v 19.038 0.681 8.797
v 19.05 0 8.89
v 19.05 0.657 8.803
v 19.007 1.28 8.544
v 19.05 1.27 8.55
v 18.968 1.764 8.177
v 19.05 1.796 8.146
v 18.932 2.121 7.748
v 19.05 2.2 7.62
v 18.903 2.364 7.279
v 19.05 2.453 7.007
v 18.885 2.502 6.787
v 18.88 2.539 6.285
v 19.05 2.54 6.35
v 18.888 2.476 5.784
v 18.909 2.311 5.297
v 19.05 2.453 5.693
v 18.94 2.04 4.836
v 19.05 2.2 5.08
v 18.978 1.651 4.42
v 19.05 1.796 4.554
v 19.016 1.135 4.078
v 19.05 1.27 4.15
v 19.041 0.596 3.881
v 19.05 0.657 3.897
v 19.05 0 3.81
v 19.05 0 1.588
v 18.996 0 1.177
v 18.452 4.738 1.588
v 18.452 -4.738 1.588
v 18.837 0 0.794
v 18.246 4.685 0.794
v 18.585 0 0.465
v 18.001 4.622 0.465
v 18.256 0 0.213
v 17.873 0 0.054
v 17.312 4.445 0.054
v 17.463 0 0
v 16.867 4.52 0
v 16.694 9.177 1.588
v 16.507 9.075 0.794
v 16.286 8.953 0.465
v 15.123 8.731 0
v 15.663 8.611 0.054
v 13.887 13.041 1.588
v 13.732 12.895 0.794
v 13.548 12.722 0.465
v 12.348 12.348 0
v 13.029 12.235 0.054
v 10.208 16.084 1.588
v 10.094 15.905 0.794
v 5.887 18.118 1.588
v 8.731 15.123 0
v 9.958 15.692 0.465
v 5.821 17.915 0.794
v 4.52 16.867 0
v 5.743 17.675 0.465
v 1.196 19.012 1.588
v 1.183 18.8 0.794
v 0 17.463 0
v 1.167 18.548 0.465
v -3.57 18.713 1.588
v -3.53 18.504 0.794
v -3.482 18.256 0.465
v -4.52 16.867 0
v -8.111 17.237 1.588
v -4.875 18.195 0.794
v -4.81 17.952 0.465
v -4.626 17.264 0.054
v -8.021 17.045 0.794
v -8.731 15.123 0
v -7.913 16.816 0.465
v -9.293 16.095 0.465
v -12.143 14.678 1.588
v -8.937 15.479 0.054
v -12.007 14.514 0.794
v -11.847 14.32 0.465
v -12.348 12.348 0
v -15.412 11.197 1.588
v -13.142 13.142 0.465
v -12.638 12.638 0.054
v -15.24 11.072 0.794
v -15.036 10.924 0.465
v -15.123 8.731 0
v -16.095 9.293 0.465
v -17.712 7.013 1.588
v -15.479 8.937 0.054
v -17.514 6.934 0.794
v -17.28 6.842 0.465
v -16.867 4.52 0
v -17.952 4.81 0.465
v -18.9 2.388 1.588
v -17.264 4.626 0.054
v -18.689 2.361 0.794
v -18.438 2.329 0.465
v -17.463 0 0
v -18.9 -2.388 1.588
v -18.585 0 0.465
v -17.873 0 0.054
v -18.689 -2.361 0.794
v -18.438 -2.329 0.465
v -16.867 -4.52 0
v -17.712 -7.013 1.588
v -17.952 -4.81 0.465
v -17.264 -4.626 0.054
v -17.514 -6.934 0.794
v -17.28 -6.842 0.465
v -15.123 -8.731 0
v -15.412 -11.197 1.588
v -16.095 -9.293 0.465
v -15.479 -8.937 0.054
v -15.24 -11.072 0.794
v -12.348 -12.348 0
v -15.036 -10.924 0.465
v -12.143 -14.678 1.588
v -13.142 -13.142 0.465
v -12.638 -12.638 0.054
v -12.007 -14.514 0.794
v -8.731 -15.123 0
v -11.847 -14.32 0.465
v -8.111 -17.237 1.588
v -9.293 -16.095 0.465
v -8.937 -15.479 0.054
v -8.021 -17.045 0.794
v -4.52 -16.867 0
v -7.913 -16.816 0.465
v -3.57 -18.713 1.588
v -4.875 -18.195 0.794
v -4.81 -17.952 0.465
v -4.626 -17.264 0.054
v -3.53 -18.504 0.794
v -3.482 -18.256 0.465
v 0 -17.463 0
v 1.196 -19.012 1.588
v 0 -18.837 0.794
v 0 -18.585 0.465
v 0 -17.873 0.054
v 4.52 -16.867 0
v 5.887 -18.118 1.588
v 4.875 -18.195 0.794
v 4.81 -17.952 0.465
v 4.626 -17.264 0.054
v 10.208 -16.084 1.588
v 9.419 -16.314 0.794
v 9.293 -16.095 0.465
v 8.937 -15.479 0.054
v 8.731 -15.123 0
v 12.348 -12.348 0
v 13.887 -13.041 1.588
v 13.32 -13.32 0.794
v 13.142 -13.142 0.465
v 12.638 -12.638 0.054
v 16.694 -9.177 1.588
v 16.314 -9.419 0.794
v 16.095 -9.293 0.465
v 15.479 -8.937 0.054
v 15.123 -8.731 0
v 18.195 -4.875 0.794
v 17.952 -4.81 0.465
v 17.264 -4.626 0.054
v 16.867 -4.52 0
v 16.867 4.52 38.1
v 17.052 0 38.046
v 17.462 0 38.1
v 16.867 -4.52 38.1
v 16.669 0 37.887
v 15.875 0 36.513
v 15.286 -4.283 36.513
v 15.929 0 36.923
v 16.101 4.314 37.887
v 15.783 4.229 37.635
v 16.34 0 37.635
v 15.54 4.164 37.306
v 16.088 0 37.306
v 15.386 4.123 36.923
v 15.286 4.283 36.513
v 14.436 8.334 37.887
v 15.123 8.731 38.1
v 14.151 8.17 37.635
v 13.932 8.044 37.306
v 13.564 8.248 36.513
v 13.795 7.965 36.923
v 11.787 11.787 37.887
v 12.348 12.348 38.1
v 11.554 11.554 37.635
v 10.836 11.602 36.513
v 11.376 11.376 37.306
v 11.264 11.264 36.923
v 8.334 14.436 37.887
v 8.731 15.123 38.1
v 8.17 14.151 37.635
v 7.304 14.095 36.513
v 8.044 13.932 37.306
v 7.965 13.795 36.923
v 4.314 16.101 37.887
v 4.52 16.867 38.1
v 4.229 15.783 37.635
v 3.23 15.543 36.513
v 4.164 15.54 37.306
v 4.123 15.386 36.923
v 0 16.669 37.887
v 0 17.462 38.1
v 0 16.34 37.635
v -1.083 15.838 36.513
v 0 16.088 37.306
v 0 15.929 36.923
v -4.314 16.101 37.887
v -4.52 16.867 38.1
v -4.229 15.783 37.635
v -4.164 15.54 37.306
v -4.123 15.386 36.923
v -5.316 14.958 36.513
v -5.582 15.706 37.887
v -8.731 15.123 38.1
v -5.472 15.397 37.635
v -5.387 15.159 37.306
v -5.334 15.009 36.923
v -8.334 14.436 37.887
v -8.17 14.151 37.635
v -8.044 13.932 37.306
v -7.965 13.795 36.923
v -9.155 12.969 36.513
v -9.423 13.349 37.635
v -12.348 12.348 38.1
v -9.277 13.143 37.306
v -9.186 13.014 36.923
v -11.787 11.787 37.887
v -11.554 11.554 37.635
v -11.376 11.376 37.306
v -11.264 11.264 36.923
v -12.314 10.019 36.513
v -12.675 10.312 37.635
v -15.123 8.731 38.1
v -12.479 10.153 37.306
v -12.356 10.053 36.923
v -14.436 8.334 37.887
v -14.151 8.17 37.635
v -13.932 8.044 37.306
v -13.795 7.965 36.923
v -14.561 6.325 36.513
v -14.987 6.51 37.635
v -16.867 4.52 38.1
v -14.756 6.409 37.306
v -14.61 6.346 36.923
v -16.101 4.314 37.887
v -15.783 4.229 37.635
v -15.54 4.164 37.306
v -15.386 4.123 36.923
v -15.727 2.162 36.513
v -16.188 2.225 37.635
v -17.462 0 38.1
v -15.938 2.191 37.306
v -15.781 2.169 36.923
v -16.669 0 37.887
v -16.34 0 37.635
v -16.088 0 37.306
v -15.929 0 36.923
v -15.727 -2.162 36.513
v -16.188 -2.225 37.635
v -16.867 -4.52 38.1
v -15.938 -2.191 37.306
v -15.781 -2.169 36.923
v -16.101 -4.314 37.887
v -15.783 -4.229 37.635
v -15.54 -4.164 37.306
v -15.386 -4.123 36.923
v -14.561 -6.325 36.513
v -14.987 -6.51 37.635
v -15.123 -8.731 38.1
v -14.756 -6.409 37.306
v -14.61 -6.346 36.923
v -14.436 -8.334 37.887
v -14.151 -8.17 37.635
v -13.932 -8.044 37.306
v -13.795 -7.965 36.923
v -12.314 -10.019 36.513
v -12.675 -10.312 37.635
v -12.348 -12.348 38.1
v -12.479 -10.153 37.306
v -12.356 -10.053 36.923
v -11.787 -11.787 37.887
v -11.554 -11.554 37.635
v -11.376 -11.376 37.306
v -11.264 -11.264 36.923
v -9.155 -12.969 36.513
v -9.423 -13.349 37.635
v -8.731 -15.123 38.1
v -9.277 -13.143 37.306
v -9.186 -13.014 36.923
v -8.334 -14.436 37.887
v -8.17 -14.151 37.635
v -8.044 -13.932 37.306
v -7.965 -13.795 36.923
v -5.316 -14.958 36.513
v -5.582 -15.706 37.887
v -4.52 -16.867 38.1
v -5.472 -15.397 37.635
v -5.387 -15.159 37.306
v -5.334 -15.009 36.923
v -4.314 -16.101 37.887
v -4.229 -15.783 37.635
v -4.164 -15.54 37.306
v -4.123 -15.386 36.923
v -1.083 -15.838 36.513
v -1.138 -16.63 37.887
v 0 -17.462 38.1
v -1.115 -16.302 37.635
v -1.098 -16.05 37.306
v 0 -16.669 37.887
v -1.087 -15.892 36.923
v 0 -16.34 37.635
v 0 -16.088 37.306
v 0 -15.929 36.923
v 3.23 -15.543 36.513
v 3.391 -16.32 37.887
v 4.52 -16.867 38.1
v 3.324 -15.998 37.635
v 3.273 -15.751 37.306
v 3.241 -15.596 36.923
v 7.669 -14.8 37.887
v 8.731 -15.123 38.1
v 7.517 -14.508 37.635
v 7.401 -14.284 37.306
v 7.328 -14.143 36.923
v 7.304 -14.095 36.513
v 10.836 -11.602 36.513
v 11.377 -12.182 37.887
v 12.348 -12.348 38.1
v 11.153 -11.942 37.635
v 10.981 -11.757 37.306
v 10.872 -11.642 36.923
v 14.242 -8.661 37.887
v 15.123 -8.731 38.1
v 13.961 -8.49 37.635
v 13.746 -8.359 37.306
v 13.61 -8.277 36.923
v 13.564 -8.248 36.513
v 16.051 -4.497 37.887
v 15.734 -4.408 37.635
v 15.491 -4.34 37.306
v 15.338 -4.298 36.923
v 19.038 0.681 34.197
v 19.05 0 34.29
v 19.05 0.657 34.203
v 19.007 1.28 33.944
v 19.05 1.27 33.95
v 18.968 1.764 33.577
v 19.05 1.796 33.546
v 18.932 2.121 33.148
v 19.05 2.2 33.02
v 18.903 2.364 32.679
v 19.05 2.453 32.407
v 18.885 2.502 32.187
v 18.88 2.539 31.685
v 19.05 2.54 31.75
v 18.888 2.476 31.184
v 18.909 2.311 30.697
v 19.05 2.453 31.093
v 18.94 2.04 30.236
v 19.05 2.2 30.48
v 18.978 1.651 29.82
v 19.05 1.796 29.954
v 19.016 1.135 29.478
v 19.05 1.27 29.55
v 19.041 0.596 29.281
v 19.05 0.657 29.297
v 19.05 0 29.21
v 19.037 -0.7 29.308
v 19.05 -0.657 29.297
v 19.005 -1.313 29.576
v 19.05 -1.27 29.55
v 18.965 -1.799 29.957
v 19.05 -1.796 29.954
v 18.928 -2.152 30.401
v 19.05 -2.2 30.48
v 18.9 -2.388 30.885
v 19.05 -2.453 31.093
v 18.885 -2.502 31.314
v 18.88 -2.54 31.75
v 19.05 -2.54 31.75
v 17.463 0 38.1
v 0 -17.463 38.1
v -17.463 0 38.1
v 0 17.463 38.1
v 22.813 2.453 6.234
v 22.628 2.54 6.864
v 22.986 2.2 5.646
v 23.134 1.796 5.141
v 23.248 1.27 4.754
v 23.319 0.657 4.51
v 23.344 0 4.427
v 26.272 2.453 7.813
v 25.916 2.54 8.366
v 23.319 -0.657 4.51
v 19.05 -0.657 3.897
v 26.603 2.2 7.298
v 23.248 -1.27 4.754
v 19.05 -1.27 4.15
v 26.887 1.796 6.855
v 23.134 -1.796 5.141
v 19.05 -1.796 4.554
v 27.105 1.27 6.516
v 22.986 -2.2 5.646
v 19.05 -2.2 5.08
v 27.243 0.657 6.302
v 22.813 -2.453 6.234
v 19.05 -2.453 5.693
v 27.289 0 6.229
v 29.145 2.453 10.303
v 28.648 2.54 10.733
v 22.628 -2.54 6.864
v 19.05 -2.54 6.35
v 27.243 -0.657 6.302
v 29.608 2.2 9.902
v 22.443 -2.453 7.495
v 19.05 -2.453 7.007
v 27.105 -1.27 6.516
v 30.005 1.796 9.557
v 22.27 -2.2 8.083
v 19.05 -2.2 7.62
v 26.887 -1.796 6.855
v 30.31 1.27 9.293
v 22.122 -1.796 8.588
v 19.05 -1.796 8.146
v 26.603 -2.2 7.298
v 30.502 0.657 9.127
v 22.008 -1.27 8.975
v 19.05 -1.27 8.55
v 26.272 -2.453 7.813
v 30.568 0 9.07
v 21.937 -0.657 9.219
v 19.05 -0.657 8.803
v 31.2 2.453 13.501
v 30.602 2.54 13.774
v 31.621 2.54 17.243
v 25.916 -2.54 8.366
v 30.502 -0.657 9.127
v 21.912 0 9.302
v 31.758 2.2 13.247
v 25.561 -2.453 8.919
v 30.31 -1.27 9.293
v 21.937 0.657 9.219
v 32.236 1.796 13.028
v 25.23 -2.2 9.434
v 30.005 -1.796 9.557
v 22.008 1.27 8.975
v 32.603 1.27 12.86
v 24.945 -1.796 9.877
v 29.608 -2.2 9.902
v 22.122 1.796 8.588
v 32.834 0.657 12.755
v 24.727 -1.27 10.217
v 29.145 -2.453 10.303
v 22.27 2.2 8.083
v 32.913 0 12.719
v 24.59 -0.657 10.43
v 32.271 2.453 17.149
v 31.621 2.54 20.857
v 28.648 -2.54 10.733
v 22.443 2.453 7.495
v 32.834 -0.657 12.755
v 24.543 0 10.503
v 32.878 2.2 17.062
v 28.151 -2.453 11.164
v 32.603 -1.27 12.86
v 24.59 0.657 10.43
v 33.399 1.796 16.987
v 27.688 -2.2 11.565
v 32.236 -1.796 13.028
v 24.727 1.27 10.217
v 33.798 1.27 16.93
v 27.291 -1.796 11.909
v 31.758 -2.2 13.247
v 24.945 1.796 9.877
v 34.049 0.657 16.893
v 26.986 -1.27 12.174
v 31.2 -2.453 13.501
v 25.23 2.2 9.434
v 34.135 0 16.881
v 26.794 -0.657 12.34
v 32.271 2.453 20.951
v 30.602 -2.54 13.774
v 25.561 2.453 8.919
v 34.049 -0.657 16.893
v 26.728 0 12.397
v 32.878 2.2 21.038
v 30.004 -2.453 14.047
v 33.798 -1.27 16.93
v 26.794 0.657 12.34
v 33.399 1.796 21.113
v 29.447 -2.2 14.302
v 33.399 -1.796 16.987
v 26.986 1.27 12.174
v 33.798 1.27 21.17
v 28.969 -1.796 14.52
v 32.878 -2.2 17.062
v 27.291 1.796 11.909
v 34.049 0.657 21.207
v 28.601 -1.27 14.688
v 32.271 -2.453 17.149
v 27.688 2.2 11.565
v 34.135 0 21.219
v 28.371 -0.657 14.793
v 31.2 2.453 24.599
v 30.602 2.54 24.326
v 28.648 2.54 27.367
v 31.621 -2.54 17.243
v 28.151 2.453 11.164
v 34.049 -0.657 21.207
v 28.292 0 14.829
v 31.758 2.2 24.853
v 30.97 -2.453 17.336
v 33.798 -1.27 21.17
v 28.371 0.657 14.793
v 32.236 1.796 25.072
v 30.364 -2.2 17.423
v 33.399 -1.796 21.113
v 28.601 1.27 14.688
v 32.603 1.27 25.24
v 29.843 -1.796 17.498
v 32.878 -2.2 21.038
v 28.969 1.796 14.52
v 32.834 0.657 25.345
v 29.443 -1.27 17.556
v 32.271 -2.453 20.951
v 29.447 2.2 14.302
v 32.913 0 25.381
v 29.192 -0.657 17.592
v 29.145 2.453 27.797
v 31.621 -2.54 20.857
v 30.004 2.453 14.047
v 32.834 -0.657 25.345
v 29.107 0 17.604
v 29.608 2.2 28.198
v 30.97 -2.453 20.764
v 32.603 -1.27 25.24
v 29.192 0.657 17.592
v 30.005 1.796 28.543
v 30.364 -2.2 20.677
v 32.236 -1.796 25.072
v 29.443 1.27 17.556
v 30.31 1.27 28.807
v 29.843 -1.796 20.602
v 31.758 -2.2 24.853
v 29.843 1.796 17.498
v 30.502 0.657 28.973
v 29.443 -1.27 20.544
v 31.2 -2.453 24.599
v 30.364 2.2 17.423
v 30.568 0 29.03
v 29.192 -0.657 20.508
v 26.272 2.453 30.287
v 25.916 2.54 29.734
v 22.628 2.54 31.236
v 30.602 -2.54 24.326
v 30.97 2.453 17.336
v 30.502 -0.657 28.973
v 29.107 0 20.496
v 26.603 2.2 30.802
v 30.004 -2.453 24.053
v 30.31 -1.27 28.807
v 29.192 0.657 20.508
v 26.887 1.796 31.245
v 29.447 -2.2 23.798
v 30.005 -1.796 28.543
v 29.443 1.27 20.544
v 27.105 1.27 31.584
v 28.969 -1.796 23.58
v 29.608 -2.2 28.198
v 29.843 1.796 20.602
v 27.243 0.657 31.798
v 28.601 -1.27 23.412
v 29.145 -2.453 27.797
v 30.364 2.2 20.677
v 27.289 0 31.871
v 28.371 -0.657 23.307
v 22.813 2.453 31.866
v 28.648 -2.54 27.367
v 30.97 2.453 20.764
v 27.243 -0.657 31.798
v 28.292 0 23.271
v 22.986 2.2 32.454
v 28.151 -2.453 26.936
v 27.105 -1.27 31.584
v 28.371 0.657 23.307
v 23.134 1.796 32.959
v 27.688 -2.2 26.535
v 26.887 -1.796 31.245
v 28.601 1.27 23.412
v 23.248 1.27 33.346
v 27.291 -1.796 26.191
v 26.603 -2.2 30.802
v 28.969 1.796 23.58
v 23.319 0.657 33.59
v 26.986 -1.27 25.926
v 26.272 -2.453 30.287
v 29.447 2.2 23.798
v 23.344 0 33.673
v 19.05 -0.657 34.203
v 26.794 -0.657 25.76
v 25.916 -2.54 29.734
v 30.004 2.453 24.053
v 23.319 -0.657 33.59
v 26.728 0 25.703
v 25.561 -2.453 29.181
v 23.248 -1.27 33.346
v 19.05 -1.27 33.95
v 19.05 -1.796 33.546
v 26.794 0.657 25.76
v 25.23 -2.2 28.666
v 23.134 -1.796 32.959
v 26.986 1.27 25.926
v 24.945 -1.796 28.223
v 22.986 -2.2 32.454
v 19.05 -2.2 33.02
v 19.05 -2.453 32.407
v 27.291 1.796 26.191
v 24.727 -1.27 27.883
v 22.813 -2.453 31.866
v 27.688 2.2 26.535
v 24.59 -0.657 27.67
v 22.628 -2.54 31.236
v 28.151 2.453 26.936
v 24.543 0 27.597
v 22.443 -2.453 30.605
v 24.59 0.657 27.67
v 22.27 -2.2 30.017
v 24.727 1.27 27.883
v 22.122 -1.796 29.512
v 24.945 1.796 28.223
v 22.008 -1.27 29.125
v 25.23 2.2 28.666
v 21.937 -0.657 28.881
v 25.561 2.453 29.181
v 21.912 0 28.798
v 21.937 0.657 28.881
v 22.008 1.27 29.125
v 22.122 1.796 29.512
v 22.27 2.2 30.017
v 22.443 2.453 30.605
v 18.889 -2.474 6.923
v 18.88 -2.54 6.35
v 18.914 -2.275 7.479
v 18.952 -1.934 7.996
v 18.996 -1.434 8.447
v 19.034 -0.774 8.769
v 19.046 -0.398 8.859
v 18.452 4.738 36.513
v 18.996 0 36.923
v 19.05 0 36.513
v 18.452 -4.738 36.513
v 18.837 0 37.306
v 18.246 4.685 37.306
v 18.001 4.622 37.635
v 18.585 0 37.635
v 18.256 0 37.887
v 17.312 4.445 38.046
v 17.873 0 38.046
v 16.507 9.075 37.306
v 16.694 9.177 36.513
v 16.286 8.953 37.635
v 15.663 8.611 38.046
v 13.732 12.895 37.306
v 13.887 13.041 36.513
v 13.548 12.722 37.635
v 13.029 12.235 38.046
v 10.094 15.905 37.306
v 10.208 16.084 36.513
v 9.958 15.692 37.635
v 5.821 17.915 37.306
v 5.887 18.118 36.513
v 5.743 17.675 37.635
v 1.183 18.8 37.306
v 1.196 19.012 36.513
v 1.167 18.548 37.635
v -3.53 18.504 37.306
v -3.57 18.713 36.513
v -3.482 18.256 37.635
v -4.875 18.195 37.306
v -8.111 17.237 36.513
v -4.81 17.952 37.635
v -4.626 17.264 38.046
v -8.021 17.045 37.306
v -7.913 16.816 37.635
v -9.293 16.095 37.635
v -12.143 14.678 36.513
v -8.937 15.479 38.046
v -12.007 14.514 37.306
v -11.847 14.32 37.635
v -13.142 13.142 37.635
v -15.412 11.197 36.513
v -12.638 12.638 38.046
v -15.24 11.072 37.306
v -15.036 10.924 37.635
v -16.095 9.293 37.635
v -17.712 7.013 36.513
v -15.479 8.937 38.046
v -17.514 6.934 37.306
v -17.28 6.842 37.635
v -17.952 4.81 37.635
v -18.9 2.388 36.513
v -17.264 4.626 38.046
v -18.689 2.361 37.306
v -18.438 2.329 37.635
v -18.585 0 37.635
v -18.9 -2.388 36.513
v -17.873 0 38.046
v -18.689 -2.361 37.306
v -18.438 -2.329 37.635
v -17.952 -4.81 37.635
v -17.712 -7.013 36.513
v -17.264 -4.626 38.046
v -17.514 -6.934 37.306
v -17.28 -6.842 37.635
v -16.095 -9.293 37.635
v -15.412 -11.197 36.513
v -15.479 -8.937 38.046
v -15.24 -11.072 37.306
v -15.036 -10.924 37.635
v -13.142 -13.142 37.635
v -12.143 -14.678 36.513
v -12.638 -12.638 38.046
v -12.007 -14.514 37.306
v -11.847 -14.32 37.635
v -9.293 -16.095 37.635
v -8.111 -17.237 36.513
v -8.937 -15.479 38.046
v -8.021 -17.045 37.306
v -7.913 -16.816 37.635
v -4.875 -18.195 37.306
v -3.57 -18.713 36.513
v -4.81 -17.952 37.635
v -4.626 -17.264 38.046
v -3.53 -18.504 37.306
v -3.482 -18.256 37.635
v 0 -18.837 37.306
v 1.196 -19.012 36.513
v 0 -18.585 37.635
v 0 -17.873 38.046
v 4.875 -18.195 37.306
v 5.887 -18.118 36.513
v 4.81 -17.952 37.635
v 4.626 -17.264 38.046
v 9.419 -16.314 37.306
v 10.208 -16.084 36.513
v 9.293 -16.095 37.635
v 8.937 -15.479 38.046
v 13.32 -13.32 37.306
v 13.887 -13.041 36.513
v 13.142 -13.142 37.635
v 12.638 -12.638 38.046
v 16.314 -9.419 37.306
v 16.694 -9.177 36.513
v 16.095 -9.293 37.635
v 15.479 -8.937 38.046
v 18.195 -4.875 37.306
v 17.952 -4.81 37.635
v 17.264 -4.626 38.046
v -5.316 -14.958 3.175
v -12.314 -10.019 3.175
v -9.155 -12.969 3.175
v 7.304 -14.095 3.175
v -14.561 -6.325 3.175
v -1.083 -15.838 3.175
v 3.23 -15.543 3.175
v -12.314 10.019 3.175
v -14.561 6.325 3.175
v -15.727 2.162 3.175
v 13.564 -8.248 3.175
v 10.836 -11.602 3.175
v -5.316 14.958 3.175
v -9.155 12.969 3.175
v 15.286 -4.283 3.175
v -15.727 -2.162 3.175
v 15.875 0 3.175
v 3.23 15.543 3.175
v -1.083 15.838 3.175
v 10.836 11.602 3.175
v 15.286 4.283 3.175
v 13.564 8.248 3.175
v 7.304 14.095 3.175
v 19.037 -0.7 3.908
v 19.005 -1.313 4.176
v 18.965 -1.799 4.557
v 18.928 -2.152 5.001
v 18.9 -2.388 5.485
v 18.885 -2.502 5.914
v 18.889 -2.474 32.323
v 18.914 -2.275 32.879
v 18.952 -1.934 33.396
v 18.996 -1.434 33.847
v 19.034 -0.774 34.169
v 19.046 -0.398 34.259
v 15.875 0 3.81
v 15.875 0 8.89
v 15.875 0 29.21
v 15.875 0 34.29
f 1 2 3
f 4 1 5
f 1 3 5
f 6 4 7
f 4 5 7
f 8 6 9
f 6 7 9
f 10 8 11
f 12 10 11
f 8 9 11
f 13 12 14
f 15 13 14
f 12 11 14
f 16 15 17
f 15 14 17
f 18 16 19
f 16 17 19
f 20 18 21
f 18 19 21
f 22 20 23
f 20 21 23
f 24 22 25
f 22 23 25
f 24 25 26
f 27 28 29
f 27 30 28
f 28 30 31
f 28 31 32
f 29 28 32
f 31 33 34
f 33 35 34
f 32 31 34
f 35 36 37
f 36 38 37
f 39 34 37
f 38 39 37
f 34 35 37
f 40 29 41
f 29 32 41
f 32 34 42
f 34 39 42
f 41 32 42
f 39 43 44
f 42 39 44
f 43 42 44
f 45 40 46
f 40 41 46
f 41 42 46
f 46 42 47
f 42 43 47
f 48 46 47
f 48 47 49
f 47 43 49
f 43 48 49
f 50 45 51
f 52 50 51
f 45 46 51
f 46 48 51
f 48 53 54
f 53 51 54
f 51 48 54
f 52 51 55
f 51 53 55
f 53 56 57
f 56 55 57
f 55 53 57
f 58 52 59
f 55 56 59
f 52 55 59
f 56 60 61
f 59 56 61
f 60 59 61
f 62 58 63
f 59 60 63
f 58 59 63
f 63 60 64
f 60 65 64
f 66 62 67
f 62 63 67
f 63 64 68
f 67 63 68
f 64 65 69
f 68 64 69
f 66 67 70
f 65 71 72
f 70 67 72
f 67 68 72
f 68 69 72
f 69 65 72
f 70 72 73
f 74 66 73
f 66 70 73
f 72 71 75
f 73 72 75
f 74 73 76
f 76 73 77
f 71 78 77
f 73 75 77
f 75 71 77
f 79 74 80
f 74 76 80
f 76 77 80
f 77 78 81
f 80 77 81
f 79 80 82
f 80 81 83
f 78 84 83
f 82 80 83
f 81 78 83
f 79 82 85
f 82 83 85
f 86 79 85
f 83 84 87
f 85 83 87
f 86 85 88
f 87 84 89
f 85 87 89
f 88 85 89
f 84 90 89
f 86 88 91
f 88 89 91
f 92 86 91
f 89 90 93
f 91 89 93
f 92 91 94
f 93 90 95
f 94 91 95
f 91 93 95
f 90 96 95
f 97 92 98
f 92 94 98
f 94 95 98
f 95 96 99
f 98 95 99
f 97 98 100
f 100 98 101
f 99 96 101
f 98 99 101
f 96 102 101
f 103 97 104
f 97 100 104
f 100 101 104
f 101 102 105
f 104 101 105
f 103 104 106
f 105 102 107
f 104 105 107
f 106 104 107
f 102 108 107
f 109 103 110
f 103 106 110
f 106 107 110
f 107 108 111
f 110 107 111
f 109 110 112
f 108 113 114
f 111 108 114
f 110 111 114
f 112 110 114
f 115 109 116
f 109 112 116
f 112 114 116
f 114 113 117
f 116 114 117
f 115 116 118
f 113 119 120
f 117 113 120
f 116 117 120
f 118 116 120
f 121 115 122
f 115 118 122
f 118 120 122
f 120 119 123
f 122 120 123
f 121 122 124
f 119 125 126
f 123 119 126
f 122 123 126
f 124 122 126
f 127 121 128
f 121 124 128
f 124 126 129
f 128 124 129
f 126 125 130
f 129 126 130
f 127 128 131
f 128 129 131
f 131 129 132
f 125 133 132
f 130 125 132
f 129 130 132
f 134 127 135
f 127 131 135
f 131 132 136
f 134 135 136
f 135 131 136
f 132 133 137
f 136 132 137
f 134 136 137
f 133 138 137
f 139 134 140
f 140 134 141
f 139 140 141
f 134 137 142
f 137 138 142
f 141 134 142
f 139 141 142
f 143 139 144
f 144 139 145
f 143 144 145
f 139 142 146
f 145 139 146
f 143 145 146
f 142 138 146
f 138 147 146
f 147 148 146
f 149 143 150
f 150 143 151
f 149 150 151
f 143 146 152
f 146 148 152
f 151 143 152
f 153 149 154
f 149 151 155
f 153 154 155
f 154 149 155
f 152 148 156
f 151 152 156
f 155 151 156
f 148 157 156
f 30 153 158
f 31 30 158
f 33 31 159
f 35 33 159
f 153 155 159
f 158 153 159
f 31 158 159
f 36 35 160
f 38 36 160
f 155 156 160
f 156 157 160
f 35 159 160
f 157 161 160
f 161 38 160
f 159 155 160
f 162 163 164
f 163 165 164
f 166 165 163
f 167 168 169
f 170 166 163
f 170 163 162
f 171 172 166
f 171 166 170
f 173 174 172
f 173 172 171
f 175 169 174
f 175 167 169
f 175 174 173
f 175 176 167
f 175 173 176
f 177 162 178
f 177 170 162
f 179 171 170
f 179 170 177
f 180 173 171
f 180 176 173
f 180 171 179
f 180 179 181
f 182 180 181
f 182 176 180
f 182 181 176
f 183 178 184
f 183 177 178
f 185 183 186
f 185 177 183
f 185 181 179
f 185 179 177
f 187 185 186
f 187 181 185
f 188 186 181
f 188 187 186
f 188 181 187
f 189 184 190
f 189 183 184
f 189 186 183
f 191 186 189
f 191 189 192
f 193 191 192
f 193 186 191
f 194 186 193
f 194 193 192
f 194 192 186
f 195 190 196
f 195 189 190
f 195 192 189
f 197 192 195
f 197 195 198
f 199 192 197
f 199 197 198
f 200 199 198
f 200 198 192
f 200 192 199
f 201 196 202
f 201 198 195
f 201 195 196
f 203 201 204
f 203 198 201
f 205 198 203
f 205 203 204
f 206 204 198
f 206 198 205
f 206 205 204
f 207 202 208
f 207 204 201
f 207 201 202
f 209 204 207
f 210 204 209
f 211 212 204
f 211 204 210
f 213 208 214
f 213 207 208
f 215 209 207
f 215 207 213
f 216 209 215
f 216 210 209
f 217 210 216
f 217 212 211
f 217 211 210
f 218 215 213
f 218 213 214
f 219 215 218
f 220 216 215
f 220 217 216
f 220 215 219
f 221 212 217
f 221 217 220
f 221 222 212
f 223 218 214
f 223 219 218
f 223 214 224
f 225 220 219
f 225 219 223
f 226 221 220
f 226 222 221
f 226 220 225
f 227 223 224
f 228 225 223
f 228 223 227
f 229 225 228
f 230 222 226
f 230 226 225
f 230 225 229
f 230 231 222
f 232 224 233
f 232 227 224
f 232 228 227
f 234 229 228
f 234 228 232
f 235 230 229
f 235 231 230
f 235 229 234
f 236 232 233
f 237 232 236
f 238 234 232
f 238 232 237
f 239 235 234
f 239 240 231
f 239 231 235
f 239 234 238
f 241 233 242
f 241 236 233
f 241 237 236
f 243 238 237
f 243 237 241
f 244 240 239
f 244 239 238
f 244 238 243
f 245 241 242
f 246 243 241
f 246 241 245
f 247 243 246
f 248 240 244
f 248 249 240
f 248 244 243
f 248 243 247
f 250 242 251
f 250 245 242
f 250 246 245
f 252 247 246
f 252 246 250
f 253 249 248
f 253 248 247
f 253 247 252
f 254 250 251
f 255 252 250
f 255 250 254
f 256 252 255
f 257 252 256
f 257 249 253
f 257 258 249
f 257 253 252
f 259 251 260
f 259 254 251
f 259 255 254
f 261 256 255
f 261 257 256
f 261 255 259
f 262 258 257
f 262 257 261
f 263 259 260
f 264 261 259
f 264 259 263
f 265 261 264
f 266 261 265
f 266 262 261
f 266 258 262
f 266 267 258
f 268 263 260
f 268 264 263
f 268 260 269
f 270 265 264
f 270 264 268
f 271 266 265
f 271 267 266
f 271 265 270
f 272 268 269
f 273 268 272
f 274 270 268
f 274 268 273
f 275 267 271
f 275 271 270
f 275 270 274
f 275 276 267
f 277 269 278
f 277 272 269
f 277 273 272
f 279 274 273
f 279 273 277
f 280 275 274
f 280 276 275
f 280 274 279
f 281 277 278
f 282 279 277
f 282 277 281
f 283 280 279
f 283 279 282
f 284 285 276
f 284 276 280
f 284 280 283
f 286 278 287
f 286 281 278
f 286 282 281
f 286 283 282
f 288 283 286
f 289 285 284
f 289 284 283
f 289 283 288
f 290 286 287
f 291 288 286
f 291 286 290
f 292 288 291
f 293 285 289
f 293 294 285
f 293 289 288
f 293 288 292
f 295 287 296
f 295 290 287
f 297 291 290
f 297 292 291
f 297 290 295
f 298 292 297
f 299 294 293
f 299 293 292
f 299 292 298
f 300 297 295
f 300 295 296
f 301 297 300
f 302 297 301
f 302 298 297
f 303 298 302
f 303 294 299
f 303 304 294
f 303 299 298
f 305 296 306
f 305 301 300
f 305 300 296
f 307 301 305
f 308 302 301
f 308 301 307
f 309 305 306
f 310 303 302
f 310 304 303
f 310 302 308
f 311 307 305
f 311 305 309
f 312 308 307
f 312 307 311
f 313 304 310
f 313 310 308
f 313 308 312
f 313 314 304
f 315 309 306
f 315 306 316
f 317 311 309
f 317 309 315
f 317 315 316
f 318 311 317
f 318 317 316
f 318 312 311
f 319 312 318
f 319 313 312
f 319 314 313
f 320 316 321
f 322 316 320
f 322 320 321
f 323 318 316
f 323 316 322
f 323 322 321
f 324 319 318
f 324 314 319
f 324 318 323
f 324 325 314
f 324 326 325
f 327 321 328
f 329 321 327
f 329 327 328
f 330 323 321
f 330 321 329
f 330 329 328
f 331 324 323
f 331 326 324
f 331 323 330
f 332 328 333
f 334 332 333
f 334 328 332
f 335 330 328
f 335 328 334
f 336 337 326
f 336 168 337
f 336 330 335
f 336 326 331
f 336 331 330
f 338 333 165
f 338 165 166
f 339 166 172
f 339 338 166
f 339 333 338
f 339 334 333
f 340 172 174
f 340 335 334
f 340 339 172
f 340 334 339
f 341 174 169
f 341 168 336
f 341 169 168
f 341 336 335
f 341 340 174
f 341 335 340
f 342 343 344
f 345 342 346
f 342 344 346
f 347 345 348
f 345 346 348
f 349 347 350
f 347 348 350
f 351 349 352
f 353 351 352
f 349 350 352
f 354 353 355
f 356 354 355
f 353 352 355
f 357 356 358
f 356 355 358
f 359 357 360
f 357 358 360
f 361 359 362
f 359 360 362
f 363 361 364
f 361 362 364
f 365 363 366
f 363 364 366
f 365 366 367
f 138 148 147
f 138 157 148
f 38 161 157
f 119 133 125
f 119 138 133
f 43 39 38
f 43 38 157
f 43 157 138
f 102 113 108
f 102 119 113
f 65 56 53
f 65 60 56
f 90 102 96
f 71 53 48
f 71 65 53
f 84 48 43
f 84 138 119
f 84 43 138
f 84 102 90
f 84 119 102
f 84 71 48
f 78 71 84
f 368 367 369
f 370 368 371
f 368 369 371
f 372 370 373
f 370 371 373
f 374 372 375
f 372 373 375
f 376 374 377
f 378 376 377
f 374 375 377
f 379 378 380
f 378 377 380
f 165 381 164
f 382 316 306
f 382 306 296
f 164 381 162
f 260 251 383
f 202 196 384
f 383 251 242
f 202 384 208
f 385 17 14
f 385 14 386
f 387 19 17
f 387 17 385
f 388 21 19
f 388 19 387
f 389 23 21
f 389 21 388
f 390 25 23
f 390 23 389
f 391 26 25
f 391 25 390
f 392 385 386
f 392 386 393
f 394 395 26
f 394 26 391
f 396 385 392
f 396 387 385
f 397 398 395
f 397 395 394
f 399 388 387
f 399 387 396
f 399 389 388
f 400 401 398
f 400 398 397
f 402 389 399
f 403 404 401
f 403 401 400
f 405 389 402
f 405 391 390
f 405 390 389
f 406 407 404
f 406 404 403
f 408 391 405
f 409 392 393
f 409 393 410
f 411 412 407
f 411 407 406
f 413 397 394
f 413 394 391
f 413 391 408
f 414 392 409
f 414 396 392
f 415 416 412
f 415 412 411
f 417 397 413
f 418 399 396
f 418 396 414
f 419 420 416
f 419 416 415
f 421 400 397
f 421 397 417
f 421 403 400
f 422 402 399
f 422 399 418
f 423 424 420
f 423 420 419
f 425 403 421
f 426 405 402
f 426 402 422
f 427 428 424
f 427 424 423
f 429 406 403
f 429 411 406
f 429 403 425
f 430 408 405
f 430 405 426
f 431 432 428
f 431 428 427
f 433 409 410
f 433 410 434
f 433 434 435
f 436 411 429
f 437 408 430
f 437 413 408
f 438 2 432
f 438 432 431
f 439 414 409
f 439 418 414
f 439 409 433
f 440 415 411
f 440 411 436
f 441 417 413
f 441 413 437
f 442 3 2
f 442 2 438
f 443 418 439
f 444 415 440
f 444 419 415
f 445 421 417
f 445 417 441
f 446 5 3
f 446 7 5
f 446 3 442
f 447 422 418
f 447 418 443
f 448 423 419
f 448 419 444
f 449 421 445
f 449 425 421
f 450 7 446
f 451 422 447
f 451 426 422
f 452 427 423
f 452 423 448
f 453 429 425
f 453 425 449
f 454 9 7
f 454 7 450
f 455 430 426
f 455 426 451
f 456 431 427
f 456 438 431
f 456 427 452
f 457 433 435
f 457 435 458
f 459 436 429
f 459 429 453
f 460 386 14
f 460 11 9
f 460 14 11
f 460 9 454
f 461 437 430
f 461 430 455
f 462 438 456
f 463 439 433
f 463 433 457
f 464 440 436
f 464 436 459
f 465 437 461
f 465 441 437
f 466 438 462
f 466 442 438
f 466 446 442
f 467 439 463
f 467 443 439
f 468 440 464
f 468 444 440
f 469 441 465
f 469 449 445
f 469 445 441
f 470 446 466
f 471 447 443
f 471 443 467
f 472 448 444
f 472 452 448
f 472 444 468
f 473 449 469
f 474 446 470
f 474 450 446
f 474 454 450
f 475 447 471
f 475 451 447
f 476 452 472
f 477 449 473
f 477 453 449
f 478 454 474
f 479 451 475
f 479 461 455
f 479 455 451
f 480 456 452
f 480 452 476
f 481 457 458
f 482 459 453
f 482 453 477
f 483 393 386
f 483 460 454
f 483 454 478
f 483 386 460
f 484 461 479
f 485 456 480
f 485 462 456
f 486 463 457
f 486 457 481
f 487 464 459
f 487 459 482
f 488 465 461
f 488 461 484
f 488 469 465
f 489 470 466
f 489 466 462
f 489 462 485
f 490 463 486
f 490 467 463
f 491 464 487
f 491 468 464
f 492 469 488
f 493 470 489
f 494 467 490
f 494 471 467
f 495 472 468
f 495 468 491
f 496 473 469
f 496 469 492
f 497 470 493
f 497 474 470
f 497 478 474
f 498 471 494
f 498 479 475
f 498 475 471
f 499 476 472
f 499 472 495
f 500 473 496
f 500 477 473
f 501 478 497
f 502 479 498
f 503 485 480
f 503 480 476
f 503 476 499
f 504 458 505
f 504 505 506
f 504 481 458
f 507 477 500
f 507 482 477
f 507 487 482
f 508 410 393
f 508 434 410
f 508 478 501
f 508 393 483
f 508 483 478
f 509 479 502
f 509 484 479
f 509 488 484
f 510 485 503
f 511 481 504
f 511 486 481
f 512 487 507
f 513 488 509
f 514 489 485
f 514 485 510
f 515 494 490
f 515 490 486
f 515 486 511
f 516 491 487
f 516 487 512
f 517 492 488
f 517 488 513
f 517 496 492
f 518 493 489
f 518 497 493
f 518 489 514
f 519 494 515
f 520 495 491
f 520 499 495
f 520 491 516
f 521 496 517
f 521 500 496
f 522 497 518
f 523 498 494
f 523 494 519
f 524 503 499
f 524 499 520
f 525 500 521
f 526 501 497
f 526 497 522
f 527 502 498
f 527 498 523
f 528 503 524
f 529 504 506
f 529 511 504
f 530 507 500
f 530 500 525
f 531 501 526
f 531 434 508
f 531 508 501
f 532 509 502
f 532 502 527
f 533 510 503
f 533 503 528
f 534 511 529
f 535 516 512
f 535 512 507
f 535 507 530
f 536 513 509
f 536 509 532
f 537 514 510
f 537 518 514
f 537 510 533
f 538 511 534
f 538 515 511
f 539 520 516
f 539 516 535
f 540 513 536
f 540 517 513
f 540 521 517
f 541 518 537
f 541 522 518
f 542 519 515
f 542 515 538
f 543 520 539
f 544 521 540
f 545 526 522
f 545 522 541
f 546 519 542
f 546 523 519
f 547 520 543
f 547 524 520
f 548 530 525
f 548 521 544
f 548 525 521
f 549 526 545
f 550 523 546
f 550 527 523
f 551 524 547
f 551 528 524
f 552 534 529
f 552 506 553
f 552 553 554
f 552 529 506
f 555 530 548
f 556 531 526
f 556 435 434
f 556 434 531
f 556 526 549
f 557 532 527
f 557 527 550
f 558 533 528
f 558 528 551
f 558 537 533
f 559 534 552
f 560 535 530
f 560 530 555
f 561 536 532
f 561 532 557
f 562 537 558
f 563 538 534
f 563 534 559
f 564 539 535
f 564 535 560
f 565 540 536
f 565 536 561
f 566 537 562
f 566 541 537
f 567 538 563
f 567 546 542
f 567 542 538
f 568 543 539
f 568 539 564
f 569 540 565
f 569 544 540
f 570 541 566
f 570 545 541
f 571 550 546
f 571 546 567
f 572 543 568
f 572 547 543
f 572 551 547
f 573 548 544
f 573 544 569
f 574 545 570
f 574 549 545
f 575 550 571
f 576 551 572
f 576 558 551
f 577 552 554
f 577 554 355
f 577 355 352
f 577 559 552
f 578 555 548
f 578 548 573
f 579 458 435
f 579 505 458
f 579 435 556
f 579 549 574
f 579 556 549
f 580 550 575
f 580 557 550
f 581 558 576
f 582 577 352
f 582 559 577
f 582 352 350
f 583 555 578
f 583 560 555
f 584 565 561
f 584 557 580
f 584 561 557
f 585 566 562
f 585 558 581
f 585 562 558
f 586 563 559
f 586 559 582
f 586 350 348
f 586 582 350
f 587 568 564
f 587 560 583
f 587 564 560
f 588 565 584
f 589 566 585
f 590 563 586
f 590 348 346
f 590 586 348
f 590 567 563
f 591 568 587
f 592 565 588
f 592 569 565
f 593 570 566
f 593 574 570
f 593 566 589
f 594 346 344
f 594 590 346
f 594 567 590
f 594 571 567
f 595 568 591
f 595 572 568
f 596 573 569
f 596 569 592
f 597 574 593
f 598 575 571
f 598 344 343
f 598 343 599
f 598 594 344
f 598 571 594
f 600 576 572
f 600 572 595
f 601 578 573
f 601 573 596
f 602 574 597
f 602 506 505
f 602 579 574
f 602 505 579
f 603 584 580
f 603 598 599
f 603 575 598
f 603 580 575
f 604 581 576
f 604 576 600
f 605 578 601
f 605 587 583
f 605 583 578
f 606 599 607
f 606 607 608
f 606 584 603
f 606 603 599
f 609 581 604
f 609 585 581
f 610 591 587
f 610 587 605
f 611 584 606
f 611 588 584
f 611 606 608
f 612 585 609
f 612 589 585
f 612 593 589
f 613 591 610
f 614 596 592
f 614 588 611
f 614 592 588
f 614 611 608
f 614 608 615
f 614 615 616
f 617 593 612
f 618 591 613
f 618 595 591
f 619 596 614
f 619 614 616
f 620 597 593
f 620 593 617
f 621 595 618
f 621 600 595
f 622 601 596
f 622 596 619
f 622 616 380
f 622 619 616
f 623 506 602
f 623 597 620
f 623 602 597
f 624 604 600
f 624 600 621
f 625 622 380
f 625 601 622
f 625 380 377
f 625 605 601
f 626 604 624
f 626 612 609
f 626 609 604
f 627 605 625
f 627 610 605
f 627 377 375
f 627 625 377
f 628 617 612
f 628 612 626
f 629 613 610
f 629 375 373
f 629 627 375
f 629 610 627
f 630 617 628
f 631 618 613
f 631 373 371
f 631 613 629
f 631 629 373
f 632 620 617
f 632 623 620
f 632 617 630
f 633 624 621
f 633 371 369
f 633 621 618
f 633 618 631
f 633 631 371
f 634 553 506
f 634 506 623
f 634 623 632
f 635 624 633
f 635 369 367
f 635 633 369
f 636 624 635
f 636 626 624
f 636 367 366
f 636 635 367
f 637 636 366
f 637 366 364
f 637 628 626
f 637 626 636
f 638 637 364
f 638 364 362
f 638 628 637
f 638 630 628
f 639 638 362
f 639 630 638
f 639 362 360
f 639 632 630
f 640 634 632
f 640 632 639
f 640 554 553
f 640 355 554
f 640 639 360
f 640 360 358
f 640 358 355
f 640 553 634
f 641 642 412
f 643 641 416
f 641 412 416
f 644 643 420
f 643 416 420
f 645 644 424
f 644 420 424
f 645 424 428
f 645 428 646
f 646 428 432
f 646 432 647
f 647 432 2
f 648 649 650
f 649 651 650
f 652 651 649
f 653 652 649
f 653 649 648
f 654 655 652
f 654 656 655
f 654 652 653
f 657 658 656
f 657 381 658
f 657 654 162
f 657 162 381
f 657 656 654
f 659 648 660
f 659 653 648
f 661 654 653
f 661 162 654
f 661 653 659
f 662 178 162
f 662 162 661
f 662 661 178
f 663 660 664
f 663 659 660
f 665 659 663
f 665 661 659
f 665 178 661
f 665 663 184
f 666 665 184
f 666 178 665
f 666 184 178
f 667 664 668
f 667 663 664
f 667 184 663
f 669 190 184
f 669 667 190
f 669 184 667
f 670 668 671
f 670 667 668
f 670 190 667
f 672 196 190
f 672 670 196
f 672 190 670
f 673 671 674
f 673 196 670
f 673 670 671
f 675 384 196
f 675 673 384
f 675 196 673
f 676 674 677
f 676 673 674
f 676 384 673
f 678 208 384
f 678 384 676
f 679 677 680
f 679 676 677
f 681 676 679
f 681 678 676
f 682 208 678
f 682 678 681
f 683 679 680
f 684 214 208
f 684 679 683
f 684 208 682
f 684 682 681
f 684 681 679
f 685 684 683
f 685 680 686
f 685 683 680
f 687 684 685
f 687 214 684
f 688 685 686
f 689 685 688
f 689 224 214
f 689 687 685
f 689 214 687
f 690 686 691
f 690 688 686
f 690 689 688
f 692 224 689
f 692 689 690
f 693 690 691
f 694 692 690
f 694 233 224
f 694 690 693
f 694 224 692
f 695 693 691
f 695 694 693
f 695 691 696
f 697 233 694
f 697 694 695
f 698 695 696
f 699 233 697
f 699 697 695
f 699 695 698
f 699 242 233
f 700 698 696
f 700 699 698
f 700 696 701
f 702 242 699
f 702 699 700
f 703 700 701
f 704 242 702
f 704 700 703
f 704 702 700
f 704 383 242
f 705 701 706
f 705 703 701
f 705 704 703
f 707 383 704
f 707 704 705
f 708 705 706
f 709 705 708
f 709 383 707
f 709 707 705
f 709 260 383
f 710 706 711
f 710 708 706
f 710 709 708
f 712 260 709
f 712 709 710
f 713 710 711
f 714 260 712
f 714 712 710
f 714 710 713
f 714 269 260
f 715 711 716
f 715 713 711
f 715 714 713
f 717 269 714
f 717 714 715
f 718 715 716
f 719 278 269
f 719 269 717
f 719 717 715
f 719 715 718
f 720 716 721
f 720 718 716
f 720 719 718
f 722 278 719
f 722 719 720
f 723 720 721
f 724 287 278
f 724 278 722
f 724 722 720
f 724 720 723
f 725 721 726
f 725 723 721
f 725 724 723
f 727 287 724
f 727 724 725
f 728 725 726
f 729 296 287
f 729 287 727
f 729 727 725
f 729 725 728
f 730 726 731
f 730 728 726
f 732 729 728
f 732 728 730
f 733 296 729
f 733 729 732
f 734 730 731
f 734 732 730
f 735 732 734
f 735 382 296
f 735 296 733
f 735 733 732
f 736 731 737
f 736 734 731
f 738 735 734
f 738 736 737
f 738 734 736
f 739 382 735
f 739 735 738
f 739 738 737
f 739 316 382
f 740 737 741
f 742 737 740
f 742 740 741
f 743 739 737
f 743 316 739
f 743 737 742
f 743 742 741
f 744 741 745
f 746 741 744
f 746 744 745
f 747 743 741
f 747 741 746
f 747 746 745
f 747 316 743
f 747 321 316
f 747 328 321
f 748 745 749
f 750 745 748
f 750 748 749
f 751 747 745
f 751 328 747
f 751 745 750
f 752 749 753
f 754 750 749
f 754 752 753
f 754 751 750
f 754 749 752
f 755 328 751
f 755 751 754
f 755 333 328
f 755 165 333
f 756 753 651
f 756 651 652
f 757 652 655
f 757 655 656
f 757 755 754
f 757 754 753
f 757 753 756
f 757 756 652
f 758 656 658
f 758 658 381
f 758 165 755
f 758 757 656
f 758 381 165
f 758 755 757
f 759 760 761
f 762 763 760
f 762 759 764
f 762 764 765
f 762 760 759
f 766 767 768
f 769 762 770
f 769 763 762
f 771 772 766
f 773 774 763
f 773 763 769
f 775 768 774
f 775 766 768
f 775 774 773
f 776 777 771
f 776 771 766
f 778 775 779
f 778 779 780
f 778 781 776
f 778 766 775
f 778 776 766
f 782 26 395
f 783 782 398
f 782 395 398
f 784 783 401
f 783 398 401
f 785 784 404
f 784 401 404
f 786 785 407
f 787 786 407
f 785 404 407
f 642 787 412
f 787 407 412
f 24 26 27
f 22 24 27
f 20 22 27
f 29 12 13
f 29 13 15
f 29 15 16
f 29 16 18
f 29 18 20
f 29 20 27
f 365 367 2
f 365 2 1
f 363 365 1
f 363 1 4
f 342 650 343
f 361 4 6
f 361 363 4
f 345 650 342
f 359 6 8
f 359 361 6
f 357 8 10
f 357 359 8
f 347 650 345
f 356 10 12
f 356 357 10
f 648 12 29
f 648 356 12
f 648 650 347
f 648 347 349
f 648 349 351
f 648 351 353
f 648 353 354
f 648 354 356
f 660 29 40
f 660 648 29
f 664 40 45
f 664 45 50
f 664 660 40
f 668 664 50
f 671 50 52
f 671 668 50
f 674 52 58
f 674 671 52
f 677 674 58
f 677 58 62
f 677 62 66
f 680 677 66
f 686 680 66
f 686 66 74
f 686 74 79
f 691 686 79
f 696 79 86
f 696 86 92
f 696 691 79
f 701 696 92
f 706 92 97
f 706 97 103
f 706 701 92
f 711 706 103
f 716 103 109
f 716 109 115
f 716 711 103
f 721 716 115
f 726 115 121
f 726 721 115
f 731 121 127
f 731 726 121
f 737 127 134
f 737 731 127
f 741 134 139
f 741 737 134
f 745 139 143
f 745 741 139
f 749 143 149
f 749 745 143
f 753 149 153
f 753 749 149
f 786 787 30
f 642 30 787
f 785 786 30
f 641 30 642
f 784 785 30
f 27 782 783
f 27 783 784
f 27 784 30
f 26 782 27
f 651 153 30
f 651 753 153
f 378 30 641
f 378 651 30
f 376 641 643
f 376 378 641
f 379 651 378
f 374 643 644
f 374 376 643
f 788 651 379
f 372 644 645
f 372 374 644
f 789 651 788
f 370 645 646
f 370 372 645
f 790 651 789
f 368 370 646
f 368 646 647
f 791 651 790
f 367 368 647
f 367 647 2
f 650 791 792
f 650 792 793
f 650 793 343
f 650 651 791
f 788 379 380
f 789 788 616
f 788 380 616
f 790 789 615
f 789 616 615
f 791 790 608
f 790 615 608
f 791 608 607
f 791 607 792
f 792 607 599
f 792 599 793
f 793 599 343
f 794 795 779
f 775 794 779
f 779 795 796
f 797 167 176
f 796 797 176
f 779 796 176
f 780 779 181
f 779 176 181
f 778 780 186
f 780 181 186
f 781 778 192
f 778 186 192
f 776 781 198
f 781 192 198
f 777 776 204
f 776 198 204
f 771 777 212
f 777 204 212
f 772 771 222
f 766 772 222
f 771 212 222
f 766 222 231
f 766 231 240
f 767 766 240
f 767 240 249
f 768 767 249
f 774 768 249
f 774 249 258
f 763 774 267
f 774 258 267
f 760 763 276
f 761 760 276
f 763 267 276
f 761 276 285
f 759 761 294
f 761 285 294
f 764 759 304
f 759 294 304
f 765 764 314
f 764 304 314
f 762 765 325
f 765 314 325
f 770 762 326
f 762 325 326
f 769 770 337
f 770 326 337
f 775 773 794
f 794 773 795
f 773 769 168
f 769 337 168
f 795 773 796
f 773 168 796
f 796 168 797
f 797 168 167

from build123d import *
from build123d import SkipClean  # not in build123d's __all__

# Parameters (mm, degrees)
F0_W      = 19.05
F0_H      = 38.1
F2_R      = 15.875
F3_DEPTH  = 34.925
F6_R      = 1.58749
F7_R      = 1.5875
F8_R      = 2.54
F10_R     = 2.54
F11_R     = 2.54
F12_DEPTH = 3.175


# Not quite as in the source:
# - a fillet or chamfer is up to 0.001 mm smaller than in the source, because OpenCascade refuses the exact size


with BuildPart() as f1:
    # F0 (on Front) → F1 (revolve)
    with BuildSketch(Plane.XZ):
        with Locations((9.525, 19.05)):
            Rectangle(F0_W, F0_H)
    revolve(axis=Axis((0, 0, 19.05), (0, 0, 1)))

    # F2 (on face) → F3 (cut)
    with BuildSketch(Plane.XY.offset(38.1)):
        Circle(F2_R)
    extrude(amount=-F3_DEPTH, mode=Mode.SUBTRACT)

    # F6 (radius 1.5875 in the source; OpenCascade refuses exactly that, so slightly less here)
    f6_edges = [f1.edges().sort_by_distance(p)[0] for p in [
        (-19.05, 0, 38.1),
        (-15.875, 0, 38.1),
    ]]
    fillet(f6_edges, radius=F6_R)

    # F7
    f7_edges = [f1.edges().sort_by_distance(p)[0] for p in [
        (-19.05, 0, 0),
    ]]
    fillet(f7_edges, radius=F7_R)

    # F9: sweep along a path in F5
    with BuildLine(Plane.XZ) as f9_path:
        ThreePointArc((19.05, 6.35), (31.75, 19.05), (19.05, 31.75))
    # F8 (on offset) → F9 (sweep)
    with BuildSketch(Plane.YZ.offset(19.05)):
        with Locations((0, 31.75)):
            Circle(F8_R)
    sweep(path=f9_path.line)

    # F10 (on face) + F11 (on face) → F12 (join, through all)
    with BuildSketch(Plane(origin=(19.05, 0, 0), x_dir=(0, -1, 0), z_dir=(-1, 0, 0))):
        with Locations((0, 31.75)):
            Circle(F10_R)
    with BuildSketch(Plane(origin=(19.05, 0, 0), x_dir=(0, -1, 0), z_dir=(-1, 0, 0))):
        with Locations((0, 6.35)):
            Circle(F11_R)
    with SkipClean():  # cleaning this boolean's faces spoils the solid; the shape is the same uncleaned
        extrude(amount=F12_DEPTH)


solid = f1.part
